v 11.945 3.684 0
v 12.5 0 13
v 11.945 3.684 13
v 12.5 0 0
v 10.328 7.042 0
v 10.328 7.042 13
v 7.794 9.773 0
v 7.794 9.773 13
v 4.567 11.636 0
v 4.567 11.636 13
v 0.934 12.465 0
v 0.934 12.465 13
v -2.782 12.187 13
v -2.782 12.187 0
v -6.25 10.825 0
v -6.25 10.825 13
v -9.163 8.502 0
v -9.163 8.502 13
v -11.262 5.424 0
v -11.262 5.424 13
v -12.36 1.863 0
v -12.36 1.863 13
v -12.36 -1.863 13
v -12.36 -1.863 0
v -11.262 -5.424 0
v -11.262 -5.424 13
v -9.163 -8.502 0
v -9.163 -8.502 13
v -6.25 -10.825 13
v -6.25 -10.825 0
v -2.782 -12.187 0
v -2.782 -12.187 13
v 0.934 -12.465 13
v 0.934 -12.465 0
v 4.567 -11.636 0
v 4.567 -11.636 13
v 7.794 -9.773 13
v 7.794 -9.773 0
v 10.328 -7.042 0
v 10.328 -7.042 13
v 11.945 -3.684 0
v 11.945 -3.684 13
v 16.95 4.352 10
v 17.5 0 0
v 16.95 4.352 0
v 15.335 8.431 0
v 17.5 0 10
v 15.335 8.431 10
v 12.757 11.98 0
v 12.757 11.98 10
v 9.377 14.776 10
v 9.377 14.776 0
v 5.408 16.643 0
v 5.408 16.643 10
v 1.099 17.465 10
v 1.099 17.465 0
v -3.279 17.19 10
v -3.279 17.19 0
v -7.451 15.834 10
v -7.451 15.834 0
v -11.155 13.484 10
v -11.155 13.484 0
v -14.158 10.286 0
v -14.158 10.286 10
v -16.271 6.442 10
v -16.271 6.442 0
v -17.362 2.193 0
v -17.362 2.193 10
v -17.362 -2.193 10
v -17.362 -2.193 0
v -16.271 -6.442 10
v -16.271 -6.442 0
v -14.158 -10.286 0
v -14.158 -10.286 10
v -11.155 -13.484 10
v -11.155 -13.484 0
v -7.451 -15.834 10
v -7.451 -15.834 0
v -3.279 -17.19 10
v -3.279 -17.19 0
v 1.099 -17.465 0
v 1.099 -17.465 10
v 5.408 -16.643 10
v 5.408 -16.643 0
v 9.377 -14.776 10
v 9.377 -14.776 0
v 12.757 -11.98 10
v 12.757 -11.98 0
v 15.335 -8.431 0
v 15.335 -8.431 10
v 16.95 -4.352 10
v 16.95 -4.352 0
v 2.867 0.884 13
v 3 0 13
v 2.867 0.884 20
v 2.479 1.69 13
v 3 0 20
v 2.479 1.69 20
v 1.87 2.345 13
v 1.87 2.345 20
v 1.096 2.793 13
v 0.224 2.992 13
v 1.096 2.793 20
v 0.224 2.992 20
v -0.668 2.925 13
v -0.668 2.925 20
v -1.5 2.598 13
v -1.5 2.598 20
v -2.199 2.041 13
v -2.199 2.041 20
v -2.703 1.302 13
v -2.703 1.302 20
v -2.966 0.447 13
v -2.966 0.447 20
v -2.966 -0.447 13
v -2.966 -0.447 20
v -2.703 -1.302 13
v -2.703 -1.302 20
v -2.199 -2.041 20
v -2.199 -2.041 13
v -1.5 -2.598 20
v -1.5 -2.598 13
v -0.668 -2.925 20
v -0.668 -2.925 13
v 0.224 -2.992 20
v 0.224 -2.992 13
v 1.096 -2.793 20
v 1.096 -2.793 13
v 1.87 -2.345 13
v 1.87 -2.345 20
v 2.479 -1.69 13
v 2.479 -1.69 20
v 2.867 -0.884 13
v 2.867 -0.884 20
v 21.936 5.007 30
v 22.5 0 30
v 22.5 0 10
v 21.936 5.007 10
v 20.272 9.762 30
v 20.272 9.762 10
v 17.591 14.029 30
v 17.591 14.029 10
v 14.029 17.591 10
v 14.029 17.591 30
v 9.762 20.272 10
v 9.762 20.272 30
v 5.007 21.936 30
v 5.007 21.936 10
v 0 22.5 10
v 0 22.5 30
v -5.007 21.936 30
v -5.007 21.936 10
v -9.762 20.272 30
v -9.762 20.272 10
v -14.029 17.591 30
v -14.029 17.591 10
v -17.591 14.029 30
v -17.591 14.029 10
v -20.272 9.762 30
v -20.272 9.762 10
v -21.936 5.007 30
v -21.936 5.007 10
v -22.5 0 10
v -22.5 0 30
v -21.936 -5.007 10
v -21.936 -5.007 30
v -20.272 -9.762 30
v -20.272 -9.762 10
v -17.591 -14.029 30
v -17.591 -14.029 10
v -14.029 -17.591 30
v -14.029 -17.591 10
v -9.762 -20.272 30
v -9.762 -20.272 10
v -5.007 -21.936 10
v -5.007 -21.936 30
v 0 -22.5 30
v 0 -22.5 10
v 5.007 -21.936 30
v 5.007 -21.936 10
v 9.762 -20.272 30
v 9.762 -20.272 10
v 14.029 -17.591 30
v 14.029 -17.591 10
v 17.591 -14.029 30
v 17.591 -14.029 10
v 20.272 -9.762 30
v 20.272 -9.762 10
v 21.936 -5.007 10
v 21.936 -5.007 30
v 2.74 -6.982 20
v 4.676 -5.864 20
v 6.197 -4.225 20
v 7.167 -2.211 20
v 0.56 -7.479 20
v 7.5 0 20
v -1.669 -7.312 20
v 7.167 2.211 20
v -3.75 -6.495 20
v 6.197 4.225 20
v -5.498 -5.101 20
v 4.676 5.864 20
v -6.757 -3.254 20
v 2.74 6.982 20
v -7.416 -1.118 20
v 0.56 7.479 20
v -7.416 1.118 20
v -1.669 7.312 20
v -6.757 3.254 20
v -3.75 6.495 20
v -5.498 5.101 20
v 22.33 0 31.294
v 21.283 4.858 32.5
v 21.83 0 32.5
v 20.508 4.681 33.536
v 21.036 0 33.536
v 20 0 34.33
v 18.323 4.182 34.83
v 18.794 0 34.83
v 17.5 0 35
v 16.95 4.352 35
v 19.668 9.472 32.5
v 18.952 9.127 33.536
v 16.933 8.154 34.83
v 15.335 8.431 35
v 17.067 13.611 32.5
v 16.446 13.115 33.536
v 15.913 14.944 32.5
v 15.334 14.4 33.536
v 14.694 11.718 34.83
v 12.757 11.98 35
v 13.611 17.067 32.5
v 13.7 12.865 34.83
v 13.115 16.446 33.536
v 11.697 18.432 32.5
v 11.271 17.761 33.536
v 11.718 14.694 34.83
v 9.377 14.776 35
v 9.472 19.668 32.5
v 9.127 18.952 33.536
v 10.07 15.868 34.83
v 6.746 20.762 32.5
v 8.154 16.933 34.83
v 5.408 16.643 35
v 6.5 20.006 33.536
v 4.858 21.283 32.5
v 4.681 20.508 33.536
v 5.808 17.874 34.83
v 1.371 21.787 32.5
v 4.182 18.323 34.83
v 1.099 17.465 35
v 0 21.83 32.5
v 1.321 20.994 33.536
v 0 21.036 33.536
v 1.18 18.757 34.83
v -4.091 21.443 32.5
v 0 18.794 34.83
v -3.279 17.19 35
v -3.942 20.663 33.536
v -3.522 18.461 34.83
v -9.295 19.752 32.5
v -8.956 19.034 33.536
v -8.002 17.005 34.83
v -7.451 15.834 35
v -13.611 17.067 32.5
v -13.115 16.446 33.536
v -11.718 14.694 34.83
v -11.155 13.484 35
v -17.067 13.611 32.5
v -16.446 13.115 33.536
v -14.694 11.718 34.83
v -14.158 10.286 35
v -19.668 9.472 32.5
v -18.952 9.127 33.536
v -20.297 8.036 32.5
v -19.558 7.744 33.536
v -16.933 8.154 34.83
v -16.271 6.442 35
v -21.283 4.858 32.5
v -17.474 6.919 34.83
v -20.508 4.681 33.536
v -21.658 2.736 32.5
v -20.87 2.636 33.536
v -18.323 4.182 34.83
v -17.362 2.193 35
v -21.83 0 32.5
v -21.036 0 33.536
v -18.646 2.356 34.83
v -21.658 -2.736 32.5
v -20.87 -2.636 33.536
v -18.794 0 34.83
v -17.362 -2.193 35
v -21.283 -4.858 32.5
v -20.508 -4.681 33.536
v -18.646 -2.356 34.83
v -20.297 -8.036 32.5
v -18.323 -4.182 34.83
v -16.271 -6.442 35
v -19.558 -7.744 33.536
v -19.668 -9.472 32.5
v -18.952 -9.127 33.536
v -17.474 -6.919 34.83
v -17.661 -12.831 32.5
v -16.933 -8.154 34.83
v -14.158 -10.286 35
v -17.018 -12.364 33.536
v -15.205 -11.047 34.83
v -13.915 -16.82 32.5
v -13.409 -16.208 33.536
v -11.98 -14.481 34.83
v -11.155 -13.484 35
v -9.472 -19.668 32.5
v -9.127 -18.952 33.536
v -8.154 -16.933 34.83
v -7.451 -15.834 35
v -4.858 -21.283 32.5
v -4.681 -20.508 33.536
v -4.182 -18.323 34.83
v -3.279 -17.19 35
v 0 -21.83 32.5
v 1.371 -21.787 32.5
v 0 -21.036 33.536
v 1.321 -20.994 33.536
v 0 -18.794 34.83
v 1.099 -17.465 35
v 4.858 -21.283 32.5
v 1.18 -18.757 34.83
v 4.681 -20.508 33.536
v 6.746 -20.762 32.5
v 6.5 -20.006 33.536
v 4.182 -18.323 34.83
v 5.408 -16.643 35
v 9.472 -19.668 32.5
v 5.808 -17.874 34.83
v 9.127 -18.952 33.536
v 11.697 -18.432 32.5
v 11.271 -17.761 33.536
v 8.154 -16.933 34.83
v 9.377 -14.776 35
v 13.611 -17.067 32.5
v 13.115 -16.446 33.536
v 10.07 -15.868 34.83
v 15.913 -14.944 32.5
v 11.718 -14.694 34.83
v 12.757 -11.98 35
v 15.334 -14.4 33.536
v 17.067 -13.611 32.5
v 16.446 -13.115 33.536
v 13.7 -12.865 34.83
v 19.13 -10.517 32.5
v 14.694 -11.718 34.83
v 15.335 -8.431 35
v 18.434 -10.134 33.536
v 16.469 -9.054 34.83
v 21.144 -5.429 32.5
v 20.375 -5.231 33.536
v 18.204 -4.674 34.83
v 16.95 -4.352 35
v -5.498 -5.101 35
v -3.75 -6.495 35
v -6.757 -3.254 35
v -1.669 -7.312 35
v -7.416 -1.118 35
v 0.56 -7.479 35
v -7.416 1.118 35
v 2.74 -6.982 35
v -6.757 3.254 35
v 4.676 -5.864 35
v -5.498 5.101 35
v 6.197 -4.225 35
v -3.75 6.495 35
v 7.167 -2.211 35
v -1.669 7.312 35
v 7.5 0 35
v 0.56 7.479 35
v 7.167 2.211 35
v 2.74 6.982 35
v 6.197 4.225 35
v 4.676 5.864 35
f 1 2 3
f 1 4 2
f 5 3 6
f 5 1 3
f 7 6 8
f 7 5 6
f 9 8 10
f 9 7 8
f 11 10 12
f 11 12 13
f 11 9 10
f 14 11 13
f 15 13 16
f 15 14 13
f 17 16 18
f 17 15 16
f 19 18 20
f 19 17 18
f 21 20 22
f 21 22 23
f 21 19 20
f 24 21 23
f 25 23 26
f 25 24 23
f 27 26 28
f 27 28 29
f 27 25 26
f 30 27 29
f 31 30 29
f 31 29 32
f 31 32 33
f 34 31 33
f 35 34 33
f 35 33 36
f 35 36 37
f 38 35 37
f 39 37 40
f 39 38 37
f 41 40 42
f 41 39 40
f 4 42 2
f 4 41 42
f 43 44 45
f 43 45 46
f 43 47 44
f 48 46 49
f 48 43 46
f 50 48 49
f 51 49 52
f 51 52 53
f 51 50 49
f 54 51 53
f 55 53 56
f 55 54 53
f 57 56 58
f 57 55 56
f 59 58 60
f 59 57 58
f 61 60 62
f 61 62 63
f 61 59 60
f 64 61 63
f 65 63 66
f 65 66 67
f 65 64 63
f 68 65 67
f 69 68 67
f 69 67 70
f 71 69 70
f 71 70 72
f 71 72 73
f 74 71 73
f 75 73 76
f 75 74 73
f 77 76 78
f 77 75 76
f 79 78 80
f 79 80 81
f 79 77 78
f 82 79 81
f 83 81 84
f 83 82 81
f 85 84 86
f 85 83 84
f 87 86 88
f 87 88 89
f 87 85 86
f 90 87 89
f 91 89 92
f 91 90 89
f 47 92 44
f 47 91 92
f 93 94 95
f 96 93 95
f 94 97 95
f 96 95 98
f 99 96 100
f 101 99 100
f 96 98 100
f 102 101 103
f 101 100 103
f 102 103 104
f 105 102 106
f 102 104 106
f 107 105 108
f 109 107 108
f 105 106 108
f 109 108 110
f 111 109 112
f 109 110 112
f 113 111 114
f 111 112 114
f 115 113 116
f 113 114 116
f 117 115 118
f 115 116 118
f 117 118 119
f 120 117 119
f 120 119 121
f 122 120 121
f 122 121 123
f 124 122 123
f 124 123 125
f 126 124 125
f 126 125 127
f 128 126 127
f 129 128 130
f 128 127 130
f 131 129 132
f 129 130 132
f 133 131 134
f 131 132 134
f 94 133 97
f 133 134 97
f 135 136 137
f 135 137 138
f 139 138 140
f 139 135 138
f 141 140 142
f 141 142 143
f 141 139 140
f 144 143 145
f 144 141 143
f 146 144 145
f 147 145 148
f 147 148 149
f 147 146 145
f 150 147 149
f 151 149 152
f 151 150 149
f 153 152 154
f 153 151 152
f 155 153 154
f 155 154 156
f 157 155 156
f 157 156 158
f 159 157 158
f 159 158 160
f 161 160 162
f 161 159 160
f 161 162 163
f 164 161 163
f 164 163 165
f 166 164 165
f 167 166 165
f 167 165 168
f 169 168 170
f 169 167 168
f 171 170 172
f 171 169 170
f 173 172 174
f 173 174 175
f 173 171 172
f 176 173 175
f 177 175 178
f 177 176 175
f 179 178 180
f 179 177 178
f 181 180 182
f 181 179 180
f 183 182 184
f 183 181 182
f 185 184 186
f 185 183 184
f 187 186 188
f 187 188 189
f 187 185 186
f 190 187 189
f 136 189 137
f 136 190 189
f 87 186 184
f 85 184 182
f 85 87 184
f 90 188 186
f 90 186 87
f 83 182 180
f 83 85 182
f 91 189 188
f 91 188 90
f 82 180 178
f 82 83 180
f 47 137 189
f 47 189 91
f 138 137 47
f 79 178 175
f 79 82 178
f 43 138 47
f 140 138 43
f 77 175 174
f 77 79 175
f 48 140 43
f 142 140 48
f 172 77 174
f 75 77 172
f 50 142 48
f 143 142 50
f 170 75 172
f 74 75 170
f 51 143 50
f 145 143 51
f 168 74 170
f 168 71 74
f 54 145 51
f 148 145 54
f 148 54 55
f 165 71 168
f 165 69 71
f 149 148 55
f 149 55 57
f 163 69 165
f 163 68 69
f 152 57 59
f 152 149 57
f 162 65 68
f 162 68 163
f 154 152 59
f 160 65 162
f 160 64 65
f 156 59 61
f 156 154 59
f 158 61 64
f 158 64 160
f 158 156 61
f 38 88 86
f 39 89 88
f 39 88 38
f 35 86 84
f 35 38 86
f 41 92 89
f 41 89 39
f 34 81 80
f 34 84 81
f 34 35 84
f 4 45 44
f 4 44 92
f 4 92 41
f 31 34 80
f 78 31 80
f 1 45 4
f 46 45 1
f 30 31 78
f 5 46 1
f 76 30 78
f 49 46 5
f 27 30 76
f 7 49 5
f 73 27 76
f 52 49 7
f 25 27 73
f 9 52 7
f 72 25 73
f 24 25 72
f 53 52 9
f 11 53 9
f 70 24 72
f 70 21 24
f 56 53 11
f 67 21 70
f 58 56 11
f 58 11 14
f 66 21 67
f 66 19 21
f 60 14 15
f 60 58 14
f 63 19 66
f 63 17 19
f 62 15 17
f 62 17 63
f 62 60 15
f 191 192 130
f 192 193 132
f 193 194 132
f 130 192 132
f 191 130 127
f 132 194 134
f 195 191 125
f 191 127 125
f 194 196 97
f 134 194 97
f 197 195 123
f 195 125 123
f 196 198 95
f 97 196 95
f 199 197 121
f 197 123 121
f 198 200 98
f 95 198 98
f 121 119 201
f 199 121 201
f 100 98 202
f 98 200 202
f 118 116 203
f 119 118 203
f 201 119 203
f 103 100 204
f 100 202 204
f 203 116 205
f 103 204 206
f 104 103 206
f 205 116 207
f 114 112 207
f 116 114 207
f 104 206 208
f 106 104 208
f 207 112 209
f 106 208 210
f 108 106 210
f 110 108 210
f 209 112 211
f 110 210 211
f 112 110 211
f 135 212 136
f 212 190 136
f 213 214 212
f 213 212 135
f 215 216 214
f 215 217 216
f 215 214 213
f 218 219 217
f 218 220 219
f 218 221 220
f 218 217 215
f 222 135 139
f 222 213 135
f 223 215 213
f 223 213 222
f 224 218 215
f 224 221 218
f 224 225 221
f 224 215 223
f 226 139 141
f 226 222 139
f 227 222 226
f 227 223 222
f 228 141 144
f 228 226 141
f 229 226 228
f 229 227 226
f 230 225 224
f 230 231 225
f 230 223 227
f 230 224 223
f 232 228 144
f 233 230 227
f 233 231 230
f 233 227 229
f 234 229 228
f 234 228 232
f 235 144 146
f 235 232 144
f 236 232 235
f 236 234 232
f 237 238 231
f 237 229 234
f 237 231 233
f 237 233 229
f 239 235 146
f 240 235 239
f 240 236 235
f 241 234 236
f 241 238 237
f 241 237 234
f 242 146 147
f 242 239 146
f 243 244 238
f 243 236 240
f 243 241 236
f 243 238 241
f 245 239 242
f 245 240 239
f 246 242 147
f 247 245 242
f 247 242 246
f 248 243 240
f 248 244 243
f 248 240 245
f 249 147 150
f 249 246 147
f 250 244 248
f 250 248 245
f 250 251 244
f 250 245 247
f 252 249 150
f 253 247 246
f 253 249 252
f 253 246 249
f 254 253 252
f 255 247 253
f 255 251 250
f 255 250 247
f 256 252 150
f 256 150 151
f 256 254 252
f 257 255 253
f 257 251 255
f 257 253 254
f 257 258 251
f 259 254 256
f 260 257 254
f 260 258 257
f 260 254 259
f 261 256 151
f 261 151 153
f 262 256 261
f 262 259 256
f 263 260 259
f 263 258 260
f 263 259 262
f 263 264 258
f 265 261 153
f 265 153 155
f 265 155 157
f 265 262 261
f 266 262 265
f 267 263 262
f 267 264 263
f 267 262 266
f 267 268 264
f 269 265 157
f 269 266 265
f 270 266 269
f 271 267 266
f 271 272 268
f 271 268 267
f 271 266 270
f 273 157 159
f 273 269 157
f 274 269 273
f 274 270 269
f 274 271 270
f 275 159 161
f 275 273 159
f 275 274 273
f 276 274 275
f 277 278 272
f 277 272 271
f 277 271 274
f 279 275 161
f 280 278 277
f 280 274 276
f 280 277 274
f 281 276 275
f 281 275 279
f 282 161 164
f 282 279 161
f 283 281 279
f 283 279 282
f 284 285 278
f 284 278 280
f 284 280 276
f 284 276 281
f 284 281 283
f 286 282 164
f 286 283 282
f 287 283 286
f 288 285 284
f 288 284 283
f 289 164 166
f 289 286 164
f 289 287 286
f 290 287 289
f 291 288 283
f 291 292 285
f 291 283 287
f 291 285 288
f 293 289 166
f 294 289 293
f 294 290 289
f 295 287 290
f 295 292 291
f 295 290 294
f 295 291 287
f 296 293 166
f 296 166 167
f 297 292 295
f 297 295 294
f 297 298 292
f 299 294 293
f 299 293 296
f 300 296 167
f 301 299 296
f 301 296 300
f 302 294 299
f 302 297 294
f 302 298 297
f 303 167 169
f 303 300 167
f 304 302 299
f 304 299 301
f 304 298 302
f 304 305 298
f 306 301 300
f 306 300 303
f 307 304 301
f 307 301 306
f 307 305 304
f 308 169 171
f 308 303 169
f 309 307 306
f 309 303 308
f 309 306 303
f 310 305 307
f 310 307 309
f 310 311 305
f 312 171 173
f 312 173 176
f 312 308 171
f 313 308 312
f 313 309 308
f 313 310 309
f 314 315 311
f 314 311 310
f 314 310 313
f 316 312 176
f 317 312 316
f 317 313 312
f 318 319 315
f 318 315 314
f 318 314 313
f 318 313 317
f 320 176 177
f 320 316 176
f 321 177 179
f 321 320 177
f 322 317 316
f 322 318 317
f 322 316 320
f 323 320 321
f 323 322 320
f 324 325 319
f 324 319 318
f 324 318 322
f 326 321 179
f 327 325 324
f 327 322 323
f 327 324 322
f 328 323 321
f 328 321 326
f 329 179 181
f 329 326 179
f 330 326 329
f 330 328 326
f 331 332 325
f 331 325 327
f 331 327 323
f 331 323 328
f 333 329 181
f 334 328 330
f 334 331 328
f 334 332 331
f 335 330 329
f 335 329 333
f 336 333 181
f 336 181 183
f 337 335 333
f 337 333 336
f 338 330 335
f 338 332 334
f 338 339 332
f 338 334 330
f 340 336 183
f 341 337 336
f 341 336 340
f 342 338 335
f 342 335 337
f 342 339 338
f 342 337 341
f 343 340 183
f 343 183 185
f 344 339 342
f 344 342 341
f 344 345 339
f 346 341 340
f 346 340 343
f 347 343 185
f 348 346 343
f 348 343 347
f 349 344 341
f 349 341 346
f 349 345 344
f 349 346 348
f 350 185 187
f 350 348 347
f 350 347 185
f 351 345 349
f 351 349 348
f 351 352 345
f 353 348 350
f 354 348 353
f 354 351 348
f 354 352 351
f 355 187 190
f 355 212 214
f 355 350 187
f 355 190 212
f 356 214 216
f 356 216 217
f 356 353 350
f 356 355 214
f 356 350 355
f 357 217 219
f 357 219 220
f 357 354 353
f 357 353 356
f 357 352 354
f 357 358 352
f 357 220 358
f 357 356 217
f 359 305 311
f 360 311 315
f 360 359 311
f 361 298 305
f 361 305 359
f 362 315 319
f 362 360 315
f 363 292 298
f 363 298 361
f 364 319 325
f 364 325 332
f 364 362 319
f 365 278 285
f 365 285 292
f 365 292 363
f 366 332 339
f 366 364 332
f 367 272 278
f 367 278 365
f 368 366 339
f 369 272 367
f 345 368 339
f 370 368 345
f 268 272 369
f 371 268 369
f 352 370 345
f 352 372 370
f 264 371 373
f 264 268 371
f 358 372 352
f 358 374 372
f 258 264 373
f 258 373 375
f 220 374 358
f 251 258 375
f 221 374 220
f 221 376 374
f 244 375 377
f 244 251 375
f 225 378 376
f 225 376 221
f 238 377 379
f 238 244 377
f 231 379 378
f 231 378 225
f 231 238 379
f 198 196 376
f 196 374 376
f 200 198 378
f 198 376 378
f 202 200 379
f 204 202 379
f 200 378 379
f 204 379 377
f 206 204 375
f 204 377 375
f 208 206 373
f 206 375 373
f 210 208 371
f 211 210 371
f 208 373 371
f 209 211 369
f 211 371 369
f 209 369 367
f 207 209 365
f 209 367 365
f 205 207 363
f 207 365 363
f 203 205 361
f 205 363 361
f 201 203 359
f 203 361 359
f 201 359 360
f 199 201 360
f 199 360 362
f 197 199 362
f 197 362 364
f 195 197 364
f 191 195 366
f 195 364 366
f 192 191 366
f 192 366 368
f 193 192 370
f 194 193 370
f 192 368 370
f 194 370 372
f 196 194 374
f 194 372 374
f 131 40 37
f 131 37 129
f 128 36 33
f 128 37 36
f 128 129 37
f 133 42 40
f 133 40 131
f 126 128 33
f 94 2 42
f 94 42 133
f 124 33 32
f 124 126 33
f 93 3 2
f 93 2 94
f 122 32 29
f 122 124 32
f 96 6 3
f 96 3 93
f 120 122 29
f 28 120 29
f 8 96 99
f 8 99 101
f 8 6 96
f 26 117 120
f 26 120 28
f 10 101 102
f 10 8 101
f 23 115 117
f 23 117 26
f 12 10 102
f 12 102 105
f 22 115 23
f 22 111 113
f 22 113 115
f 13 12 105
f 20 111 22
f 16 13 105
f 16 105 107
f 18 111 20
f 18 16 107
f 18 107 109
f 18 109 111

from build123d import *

# Parameters (mm, degrees)
F0_W   = 4.5
F0_H   = 7
F0_W_2 = 5
F0_H_2 = 3
F0_H_3 = 15
F0_H_4 = 10
F2_R   = 5


with BuildPart() as f1:
    # F0 (on Front) → F1 (revolve)
    with BuildSketch(Plane.XZ):
        with Locations((5.25, 16.5)):
            Rectangle(F0_W, F0_H)
        with Locations((20, 11.5)):
            Rectangle(F0_W_2, F0_H_2)
        with Locations((20, 16.5)):
            Rectangle(F0_W_2, F0_H)
        with Locations((20, 27.5)):
            Rectangle(F0_W_2, F0_H_3)
        with Locations((15, 27.5)):
            Rectangle(F0_W_2, F0_H_3)
        with Locations((10, 27.5)):
            Rectangle(F0_W_2, F0_H_3)
        with Locations((10, 16.5)):
            Rectangle(F0_W_2, F0_H)
        with Locations((15, 16.5)):
            Rectangle(F0_W_2, F0_H)
        with Locations((15, 5)):
            Rectangle(F0_W_2, F0_H_4)
        with Locations((15, 11.5)):
            Rectangle(F0_W_2, F0_H_2)
    revolve(axis=Axis((0, 0, 17.5), (0, 0, 1)))

    # F2
    f2_edges = [f1.edges().sort_by_distance(p)[0] for p in [
        (-22.5, 0, 35),
    ]]
    fillet(f2_edges, radius=F2_R)


solid = f1.part
